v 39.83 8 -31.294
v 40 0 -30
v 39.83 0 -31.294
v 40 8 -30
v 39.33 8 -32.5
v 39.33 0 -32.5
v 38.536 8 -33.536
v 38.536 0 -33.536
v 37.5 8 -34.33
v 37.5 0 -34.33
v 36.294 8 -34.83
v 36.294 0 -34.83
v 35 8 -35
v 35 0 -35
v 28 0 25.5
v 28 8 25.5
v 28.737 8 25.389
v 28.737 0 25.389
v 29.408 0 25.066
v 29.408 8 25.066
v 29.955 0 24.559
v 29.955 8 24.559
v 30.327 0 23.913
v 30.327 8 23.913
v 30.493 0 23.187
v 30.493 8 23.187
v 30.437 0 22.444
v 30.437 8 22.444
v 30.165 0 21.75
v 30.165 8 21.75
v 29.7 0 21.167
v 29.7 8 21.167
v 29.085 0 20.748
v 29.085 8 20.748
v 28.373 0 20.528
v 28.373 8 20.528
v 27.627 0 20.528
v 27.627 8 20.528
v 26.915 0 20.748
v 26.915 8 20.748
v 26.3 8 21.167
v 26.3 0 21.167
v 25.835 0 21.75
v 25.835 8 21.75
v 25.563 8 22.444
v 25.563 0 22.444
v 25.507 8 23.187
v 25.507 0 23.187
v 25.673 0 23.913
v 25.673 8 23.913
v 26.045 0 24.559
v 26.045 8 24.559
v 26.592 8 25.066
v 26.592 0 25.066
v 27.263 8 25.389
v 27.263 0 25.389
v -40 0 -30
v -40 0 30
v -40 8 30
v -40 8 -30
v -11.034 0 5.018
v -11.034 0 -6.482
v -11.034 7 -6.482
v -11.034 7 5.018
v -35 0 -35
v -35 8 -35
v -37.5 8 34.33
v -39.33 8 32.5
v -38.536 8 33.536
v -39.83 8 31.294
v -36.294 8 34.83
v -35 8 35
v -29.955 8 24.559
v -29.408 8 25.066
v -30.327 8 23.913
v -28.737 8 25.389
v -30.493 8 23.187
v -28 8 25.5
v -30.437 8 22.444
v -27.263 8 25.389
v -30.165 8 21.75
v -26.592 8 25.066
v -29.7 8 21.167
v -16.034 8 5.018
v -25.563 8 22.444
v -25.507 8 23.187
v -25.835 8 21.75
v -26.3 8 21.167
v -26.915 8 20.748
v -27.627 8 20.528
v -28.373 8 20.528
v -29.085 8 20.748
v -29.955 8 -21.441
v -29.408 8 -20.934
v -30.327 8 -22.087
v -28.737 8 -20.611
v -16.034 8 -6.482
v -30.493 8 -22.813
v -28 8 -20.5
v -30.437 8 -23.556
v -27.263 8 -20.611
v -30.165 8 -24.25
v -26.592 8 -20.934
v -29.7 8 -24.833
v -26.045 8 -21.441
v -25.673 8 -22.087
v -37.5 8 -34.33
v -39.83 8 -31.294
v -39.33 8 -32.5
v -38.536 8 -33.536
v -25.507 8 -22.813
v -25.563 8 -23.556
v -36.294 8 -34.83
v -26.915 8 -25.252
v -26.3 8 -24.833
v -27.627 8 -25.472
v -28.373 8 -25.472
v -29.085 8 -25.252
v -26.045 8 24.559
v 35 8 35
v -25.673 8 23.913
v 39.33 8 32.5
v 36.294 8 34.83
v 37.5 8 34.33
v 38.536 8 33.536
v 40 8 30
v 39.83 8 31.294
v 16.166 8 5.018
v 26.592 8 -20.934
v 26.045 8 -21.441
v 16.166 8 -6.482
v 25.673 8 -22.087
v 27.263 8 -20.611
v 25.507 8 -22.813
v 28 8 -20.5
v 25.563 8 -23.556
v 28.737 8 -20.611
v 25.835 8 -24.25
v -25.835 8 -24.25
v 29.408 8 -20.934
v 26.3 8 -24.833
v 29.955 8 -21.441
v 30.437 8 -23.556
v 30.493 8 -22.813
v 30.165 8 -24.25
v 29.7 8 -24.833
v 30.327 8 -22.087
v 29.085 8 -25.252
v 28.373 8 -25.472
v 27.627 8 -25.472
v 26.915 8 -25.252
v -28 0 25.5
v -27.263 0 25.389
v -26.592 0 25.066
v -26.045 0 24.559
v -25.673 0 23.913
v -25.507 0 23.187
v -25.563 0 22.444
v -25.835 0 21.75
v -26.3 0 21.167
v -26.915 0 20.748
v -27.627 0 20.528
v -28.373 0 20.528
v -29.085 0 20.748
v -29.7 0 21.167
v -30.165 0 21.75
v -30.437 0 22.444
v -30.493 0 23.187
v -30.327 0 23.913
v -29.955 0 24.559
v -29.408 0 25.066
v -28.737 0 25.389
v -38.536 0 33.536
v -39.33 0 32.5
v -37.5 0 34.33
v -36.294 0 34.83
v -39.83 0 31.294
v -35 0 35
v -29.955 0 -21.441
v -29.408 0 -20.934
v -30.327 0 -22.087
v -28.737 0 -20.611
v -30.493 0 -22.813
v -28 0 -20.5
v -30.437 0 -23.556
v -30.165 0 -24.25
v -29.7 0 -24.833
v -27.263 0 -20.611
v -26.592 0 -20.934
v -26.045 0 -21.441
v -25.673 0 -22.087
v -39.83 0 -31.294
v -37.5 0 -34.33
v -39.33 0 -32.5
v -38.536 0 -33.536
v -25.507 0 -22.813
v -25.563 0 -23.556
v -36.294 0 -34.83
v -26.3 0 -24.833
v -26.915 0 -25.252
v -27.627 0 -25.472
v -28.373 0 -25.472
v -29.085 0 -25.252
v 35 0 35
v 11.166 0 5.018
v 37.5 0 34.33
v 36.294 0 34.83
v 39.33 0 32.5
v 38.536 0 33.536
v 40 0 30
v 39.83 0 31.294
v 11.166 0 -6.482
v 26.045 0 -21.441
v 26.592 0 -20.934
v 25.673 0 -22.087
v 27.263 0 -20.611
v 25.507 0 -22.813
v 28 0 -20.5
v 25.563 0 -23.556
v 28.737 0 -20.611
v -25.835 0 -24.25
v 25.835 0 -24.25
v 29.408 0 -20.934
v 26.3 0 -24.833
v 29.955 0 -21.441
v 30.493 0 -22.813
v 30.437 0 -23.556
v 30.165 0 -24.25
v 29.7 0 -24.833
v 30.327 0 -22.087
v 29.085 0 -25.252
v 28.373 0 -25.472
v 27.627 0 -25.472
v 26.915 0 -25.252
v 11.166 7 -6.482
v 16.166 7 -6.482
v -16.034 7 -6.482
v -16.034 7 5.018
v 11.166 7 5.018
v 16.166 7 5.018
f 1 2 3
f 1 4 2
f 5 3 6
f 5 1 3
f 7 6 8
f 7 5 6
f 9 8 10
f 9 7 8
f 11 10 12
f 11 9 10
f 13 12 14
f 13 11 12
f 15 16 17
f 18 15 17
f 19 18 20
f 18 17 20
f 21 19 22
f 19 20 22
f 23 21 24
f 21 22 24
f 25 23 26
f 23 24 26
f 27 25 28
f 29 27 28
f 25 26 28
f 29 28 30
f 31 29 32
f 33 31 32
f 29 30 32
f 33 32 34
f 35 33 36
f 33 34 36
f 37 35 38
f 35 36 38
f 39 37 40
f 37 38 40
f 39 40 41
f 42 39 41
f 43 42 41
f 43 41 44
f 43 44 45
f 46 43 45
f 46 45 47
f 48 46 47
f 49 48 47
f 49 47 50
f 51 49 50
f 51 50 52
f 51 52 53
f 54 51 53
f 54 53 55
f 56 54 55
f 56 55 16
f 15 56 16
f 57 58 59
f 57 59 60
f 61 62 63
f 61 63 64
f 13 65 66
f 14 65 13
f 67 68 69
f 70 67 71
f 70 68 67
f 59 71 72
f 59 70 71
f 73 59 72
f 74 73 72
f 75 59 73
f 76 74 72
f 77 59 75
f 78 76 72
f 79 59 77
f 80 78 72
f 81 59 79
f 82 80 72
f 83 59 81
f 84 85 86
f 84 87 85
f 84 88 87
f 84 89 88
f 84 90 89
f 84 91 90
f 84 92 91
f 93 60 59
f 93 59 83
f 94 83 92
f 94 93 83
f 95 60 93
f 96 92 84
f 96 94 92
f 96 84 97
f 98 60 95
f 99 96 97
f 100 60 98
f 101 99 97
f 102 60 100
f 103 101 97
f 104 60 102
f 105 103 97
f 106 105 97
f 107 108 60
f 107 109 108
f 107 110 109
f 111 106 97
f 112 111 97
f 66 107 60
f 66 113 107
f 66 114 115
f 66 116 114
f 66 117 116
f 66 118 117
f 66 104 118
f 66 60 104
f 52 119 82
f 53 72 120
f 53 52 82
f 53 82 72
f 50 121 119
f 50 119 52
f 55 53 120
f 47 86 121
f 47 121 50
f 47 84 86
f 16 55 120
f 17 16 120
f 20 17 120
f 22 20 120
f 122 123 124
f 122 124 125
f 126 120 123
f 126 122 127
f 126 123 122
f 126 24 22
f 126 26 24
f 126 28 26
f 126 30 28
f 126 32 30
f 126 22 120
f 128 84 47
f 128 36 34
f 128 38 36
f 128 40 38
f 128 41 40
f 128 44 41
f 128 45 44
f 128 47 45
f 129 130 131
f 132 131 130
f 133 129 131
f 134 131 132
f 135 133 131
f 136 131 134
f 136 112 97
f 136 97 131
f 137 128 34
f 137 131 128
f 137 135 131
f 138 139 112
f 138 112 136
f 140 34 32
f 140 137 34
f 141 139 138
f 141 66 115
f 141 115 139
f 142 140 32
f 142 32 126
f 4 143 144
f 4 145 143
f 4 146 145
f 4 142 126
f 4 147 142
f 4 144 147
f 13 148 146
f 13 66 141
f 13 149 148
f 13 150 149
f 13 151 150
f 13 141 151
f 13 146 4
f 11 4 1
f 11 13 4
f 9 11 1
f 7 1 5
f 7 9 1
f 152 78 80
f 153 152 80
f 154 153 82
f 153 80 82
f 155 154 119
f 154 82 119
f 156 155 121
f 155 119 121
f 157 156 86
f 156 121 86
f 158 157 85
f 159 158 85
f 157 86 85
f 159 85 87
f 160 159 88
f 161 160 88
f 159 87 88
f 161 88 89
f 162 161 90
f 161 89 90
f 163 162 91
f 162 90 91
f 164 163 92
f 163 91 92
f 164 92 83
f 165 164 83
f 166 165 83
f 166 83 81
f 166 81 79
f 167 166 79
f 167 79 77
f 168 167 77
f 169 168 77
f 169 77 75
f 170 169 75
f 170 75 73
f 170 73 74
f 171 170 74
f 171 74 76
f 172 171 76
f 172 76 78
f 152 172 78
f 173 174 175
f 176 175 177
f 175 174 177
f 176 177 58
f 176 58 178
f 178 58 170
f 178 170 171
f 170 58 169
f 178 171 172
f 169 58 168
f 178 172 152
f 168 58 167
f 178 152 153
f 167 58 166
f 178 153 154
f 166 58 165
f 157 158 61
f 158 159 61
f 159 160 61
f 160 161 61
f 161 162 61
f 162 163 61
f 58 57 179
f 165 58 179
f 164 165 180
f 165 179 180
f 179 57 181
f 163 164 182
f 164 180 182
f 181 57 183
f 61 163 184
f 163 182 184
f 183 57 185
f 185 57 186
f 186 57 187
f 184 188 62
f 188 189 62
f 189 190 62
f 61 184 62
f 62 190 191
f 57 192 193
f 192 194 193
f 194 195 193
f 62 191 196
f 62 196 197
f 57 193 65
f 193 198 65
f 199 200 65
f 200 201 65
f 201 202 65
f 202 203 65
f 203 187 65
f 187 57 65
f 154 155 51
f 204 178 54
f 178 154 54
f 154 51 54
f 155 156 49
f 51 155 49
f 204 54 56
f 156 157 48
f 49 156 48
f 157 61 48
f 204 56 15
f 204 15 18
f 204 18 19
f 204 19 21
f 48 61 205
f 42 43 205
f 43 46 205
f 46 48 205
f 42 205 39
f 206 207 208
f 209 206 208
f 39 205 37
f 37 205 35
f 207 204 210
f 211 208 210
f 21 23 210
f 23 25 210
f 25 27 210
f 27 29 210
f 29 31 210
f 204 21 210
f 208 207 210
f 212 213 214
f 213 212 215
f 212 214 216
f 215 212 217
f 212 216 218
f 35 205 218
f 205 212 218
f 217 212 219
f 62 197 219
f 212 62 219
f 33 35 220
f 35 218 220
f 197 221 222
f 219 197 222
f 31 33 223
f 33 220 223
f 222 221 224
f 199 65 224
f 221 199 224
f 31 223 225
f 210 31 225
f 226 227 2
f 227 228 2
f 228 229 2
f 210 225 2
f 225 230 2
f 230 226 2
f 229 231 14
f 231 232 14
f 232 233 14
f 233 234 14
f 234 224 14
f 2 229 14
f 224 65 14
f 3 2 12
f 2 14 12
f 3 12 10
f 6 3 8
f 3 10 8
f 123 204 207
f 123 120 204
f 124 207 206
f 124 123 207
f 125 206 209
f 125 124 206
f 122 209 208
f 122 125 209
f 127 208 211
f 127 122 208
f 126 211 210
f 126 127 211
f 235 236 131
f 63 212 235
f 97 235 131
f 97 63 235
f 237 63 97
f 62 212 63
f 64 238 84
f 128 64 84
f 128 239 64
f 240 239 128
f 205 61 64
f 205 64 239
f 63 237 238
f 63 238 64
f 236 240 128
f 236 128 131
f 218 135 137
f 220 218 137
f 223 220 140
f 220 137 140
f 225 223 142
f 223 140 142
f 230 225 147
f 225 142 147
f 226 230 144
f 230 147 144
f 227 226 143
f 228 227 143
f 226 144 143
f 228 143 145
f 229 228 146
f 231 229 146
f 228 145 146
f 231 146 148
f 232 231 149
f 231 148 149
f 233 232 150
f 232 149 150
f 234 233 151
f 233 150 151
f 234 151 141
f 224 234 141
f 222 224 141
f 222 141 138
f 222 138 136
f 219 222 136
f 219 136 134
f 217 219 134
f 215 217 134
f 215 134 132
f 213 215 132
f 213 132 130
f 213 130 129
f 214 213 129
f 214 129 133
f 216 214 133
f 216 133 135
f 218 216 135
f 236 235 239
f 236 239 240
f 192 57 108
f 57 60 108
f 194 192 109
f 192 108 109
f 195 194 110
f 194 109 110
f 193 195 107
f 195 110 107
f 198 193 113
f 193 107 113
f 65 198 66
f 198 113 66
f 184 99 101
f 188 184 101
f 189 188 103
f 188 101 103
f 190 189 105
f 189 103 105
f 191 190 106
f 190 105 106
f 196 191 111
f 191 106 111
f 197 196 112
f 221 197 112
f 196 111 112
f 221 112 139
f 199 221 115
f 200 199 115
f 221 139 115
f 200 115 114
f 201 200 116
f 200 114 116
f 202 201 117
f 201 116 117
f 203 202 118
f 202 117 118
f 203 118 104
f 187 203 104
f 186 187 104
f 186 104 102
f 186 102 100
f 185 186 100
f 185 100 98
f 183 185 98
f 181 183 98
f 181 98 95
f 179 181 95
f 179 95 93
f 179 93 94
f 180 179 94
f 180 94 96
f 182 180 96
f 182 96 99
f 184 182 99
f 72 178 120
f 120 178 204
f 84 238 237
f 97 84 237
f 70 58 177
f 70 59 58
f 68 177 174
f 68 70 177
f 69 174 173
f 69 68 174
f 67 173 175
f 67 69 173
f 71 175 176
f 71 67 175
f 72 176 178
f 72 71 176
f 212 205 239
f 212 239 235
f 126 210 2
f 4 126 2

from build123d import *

# Parameters (mm, degrees)
SKETCH1_W               = 80
SKETCH1_H               = 70
BOSS_EXTRUDE1_DEPTH     = 8
FILLET1_R               = 5
CUT_EXTRUDE1_DEPTH      = 54.749418602
CUT_EXTRUDE1_DEPTH_BACK = 18
SKETCH2_W               = 22.2
SKETCH2_H               = 11.5
CUT_EXTRUDE2_DEPTH      = 54.749418602
CUT_EXTRUDE2_DEPTH_BACK = 1
SKETCH2_3_W             = 5
SKETCH2_3_H             = 11.5
SKETCH3_R               = 2.5
CUT_EXTRUDE3_DEPTH      = 31


with BuildPart() as part:
    # Sketch1 → Boss-Extrude1 (new body)
    with BuildSketch(Plane(origin=(0, 0, 0), x_dir=(1, 0, 0), z_dir=(0, 1, 0))):
        Rectangle(SKETCH1_W, SKETCH1_H)
    extrude(amount=BOSS_EXTRUDE1_DEPTH)

    # Fillet1
    fillet1_edges = [part.edges().sort_by_distance(p)[0] for p in [
        (40, 4, 35),
        (-40, 4, 35),
        (-40, 4, -35),
        (40, 4, -35),
    ]]
    fillet(fillet1_edges, radius=FILLET1_R)

    # Sketch2 → Cut-Extrude1 (cut, two sides: drawn at the far end of the back side and taken through both)
    with BuildSketch(Plane(origin=(0, 8, 0), x_dir=(1, 0, 0), z_dir=(0, 1, 0)).offset(-CUT_EXTRUDE1_DEPTH_BACK)):
        with Locations((0.065960995, 0.732397703)):
            Rectangle(SKETCH2_W, SKETCH2_H)
    extrude(amount=CUT_EXTRUDE1_DEPTH + CUT_EXTRUDE1_DEPTH_BACK, mode=Mode.SUBTRACT)

    # Sketch2<3> → Cut-Extrude2 (cut, two sides: drawn at the far end of the back side and taken through both)
    with BuildSketch(Plane(origin=(0, 8, 0), x_dir=(1, 0, 0), z_dir=(0, 1, 0)).offset(-CUT_EXTRUDE2_DEPTH_BACK)):
        with Locations((13.665960995, 0.732397703)):
            Rectangle(SKETCH2_3_W, SKETCH2_3_H)
        with Locations((-13.534039005, 0.732397703)):
            Rectangle(SKETCH2_3_W, SKETCH2_3_H)
    extrude(amount=CUT_EXTRUDE2_DEPTH + CUT_EXTRUDE2_DEPTH_BACK, mode=Mode.SUBTRACT)

    # Sketch3 → Cut-Extrude3 (cut)
    with BuildSketch(Plane(origin=(0, 8, 0), x_dir=(1, 0, 0), z_dir=(0, 1, 0))):
        with Locations((28, 23)):
            Circle(SKETCH3_R)
        with Locations((28, -23)):
            Circle(SKETCH3_R)
        with Locations((-28, 23)):
            Circle(SKETCH3_R)
        with Locations((-28, -23)):
            Circle(SKETCH3_R)
    extrude(amount=-CUT_EXTRUDE3_DEPTH, mode=Mode.SUBTRACT)


solid = part.part
